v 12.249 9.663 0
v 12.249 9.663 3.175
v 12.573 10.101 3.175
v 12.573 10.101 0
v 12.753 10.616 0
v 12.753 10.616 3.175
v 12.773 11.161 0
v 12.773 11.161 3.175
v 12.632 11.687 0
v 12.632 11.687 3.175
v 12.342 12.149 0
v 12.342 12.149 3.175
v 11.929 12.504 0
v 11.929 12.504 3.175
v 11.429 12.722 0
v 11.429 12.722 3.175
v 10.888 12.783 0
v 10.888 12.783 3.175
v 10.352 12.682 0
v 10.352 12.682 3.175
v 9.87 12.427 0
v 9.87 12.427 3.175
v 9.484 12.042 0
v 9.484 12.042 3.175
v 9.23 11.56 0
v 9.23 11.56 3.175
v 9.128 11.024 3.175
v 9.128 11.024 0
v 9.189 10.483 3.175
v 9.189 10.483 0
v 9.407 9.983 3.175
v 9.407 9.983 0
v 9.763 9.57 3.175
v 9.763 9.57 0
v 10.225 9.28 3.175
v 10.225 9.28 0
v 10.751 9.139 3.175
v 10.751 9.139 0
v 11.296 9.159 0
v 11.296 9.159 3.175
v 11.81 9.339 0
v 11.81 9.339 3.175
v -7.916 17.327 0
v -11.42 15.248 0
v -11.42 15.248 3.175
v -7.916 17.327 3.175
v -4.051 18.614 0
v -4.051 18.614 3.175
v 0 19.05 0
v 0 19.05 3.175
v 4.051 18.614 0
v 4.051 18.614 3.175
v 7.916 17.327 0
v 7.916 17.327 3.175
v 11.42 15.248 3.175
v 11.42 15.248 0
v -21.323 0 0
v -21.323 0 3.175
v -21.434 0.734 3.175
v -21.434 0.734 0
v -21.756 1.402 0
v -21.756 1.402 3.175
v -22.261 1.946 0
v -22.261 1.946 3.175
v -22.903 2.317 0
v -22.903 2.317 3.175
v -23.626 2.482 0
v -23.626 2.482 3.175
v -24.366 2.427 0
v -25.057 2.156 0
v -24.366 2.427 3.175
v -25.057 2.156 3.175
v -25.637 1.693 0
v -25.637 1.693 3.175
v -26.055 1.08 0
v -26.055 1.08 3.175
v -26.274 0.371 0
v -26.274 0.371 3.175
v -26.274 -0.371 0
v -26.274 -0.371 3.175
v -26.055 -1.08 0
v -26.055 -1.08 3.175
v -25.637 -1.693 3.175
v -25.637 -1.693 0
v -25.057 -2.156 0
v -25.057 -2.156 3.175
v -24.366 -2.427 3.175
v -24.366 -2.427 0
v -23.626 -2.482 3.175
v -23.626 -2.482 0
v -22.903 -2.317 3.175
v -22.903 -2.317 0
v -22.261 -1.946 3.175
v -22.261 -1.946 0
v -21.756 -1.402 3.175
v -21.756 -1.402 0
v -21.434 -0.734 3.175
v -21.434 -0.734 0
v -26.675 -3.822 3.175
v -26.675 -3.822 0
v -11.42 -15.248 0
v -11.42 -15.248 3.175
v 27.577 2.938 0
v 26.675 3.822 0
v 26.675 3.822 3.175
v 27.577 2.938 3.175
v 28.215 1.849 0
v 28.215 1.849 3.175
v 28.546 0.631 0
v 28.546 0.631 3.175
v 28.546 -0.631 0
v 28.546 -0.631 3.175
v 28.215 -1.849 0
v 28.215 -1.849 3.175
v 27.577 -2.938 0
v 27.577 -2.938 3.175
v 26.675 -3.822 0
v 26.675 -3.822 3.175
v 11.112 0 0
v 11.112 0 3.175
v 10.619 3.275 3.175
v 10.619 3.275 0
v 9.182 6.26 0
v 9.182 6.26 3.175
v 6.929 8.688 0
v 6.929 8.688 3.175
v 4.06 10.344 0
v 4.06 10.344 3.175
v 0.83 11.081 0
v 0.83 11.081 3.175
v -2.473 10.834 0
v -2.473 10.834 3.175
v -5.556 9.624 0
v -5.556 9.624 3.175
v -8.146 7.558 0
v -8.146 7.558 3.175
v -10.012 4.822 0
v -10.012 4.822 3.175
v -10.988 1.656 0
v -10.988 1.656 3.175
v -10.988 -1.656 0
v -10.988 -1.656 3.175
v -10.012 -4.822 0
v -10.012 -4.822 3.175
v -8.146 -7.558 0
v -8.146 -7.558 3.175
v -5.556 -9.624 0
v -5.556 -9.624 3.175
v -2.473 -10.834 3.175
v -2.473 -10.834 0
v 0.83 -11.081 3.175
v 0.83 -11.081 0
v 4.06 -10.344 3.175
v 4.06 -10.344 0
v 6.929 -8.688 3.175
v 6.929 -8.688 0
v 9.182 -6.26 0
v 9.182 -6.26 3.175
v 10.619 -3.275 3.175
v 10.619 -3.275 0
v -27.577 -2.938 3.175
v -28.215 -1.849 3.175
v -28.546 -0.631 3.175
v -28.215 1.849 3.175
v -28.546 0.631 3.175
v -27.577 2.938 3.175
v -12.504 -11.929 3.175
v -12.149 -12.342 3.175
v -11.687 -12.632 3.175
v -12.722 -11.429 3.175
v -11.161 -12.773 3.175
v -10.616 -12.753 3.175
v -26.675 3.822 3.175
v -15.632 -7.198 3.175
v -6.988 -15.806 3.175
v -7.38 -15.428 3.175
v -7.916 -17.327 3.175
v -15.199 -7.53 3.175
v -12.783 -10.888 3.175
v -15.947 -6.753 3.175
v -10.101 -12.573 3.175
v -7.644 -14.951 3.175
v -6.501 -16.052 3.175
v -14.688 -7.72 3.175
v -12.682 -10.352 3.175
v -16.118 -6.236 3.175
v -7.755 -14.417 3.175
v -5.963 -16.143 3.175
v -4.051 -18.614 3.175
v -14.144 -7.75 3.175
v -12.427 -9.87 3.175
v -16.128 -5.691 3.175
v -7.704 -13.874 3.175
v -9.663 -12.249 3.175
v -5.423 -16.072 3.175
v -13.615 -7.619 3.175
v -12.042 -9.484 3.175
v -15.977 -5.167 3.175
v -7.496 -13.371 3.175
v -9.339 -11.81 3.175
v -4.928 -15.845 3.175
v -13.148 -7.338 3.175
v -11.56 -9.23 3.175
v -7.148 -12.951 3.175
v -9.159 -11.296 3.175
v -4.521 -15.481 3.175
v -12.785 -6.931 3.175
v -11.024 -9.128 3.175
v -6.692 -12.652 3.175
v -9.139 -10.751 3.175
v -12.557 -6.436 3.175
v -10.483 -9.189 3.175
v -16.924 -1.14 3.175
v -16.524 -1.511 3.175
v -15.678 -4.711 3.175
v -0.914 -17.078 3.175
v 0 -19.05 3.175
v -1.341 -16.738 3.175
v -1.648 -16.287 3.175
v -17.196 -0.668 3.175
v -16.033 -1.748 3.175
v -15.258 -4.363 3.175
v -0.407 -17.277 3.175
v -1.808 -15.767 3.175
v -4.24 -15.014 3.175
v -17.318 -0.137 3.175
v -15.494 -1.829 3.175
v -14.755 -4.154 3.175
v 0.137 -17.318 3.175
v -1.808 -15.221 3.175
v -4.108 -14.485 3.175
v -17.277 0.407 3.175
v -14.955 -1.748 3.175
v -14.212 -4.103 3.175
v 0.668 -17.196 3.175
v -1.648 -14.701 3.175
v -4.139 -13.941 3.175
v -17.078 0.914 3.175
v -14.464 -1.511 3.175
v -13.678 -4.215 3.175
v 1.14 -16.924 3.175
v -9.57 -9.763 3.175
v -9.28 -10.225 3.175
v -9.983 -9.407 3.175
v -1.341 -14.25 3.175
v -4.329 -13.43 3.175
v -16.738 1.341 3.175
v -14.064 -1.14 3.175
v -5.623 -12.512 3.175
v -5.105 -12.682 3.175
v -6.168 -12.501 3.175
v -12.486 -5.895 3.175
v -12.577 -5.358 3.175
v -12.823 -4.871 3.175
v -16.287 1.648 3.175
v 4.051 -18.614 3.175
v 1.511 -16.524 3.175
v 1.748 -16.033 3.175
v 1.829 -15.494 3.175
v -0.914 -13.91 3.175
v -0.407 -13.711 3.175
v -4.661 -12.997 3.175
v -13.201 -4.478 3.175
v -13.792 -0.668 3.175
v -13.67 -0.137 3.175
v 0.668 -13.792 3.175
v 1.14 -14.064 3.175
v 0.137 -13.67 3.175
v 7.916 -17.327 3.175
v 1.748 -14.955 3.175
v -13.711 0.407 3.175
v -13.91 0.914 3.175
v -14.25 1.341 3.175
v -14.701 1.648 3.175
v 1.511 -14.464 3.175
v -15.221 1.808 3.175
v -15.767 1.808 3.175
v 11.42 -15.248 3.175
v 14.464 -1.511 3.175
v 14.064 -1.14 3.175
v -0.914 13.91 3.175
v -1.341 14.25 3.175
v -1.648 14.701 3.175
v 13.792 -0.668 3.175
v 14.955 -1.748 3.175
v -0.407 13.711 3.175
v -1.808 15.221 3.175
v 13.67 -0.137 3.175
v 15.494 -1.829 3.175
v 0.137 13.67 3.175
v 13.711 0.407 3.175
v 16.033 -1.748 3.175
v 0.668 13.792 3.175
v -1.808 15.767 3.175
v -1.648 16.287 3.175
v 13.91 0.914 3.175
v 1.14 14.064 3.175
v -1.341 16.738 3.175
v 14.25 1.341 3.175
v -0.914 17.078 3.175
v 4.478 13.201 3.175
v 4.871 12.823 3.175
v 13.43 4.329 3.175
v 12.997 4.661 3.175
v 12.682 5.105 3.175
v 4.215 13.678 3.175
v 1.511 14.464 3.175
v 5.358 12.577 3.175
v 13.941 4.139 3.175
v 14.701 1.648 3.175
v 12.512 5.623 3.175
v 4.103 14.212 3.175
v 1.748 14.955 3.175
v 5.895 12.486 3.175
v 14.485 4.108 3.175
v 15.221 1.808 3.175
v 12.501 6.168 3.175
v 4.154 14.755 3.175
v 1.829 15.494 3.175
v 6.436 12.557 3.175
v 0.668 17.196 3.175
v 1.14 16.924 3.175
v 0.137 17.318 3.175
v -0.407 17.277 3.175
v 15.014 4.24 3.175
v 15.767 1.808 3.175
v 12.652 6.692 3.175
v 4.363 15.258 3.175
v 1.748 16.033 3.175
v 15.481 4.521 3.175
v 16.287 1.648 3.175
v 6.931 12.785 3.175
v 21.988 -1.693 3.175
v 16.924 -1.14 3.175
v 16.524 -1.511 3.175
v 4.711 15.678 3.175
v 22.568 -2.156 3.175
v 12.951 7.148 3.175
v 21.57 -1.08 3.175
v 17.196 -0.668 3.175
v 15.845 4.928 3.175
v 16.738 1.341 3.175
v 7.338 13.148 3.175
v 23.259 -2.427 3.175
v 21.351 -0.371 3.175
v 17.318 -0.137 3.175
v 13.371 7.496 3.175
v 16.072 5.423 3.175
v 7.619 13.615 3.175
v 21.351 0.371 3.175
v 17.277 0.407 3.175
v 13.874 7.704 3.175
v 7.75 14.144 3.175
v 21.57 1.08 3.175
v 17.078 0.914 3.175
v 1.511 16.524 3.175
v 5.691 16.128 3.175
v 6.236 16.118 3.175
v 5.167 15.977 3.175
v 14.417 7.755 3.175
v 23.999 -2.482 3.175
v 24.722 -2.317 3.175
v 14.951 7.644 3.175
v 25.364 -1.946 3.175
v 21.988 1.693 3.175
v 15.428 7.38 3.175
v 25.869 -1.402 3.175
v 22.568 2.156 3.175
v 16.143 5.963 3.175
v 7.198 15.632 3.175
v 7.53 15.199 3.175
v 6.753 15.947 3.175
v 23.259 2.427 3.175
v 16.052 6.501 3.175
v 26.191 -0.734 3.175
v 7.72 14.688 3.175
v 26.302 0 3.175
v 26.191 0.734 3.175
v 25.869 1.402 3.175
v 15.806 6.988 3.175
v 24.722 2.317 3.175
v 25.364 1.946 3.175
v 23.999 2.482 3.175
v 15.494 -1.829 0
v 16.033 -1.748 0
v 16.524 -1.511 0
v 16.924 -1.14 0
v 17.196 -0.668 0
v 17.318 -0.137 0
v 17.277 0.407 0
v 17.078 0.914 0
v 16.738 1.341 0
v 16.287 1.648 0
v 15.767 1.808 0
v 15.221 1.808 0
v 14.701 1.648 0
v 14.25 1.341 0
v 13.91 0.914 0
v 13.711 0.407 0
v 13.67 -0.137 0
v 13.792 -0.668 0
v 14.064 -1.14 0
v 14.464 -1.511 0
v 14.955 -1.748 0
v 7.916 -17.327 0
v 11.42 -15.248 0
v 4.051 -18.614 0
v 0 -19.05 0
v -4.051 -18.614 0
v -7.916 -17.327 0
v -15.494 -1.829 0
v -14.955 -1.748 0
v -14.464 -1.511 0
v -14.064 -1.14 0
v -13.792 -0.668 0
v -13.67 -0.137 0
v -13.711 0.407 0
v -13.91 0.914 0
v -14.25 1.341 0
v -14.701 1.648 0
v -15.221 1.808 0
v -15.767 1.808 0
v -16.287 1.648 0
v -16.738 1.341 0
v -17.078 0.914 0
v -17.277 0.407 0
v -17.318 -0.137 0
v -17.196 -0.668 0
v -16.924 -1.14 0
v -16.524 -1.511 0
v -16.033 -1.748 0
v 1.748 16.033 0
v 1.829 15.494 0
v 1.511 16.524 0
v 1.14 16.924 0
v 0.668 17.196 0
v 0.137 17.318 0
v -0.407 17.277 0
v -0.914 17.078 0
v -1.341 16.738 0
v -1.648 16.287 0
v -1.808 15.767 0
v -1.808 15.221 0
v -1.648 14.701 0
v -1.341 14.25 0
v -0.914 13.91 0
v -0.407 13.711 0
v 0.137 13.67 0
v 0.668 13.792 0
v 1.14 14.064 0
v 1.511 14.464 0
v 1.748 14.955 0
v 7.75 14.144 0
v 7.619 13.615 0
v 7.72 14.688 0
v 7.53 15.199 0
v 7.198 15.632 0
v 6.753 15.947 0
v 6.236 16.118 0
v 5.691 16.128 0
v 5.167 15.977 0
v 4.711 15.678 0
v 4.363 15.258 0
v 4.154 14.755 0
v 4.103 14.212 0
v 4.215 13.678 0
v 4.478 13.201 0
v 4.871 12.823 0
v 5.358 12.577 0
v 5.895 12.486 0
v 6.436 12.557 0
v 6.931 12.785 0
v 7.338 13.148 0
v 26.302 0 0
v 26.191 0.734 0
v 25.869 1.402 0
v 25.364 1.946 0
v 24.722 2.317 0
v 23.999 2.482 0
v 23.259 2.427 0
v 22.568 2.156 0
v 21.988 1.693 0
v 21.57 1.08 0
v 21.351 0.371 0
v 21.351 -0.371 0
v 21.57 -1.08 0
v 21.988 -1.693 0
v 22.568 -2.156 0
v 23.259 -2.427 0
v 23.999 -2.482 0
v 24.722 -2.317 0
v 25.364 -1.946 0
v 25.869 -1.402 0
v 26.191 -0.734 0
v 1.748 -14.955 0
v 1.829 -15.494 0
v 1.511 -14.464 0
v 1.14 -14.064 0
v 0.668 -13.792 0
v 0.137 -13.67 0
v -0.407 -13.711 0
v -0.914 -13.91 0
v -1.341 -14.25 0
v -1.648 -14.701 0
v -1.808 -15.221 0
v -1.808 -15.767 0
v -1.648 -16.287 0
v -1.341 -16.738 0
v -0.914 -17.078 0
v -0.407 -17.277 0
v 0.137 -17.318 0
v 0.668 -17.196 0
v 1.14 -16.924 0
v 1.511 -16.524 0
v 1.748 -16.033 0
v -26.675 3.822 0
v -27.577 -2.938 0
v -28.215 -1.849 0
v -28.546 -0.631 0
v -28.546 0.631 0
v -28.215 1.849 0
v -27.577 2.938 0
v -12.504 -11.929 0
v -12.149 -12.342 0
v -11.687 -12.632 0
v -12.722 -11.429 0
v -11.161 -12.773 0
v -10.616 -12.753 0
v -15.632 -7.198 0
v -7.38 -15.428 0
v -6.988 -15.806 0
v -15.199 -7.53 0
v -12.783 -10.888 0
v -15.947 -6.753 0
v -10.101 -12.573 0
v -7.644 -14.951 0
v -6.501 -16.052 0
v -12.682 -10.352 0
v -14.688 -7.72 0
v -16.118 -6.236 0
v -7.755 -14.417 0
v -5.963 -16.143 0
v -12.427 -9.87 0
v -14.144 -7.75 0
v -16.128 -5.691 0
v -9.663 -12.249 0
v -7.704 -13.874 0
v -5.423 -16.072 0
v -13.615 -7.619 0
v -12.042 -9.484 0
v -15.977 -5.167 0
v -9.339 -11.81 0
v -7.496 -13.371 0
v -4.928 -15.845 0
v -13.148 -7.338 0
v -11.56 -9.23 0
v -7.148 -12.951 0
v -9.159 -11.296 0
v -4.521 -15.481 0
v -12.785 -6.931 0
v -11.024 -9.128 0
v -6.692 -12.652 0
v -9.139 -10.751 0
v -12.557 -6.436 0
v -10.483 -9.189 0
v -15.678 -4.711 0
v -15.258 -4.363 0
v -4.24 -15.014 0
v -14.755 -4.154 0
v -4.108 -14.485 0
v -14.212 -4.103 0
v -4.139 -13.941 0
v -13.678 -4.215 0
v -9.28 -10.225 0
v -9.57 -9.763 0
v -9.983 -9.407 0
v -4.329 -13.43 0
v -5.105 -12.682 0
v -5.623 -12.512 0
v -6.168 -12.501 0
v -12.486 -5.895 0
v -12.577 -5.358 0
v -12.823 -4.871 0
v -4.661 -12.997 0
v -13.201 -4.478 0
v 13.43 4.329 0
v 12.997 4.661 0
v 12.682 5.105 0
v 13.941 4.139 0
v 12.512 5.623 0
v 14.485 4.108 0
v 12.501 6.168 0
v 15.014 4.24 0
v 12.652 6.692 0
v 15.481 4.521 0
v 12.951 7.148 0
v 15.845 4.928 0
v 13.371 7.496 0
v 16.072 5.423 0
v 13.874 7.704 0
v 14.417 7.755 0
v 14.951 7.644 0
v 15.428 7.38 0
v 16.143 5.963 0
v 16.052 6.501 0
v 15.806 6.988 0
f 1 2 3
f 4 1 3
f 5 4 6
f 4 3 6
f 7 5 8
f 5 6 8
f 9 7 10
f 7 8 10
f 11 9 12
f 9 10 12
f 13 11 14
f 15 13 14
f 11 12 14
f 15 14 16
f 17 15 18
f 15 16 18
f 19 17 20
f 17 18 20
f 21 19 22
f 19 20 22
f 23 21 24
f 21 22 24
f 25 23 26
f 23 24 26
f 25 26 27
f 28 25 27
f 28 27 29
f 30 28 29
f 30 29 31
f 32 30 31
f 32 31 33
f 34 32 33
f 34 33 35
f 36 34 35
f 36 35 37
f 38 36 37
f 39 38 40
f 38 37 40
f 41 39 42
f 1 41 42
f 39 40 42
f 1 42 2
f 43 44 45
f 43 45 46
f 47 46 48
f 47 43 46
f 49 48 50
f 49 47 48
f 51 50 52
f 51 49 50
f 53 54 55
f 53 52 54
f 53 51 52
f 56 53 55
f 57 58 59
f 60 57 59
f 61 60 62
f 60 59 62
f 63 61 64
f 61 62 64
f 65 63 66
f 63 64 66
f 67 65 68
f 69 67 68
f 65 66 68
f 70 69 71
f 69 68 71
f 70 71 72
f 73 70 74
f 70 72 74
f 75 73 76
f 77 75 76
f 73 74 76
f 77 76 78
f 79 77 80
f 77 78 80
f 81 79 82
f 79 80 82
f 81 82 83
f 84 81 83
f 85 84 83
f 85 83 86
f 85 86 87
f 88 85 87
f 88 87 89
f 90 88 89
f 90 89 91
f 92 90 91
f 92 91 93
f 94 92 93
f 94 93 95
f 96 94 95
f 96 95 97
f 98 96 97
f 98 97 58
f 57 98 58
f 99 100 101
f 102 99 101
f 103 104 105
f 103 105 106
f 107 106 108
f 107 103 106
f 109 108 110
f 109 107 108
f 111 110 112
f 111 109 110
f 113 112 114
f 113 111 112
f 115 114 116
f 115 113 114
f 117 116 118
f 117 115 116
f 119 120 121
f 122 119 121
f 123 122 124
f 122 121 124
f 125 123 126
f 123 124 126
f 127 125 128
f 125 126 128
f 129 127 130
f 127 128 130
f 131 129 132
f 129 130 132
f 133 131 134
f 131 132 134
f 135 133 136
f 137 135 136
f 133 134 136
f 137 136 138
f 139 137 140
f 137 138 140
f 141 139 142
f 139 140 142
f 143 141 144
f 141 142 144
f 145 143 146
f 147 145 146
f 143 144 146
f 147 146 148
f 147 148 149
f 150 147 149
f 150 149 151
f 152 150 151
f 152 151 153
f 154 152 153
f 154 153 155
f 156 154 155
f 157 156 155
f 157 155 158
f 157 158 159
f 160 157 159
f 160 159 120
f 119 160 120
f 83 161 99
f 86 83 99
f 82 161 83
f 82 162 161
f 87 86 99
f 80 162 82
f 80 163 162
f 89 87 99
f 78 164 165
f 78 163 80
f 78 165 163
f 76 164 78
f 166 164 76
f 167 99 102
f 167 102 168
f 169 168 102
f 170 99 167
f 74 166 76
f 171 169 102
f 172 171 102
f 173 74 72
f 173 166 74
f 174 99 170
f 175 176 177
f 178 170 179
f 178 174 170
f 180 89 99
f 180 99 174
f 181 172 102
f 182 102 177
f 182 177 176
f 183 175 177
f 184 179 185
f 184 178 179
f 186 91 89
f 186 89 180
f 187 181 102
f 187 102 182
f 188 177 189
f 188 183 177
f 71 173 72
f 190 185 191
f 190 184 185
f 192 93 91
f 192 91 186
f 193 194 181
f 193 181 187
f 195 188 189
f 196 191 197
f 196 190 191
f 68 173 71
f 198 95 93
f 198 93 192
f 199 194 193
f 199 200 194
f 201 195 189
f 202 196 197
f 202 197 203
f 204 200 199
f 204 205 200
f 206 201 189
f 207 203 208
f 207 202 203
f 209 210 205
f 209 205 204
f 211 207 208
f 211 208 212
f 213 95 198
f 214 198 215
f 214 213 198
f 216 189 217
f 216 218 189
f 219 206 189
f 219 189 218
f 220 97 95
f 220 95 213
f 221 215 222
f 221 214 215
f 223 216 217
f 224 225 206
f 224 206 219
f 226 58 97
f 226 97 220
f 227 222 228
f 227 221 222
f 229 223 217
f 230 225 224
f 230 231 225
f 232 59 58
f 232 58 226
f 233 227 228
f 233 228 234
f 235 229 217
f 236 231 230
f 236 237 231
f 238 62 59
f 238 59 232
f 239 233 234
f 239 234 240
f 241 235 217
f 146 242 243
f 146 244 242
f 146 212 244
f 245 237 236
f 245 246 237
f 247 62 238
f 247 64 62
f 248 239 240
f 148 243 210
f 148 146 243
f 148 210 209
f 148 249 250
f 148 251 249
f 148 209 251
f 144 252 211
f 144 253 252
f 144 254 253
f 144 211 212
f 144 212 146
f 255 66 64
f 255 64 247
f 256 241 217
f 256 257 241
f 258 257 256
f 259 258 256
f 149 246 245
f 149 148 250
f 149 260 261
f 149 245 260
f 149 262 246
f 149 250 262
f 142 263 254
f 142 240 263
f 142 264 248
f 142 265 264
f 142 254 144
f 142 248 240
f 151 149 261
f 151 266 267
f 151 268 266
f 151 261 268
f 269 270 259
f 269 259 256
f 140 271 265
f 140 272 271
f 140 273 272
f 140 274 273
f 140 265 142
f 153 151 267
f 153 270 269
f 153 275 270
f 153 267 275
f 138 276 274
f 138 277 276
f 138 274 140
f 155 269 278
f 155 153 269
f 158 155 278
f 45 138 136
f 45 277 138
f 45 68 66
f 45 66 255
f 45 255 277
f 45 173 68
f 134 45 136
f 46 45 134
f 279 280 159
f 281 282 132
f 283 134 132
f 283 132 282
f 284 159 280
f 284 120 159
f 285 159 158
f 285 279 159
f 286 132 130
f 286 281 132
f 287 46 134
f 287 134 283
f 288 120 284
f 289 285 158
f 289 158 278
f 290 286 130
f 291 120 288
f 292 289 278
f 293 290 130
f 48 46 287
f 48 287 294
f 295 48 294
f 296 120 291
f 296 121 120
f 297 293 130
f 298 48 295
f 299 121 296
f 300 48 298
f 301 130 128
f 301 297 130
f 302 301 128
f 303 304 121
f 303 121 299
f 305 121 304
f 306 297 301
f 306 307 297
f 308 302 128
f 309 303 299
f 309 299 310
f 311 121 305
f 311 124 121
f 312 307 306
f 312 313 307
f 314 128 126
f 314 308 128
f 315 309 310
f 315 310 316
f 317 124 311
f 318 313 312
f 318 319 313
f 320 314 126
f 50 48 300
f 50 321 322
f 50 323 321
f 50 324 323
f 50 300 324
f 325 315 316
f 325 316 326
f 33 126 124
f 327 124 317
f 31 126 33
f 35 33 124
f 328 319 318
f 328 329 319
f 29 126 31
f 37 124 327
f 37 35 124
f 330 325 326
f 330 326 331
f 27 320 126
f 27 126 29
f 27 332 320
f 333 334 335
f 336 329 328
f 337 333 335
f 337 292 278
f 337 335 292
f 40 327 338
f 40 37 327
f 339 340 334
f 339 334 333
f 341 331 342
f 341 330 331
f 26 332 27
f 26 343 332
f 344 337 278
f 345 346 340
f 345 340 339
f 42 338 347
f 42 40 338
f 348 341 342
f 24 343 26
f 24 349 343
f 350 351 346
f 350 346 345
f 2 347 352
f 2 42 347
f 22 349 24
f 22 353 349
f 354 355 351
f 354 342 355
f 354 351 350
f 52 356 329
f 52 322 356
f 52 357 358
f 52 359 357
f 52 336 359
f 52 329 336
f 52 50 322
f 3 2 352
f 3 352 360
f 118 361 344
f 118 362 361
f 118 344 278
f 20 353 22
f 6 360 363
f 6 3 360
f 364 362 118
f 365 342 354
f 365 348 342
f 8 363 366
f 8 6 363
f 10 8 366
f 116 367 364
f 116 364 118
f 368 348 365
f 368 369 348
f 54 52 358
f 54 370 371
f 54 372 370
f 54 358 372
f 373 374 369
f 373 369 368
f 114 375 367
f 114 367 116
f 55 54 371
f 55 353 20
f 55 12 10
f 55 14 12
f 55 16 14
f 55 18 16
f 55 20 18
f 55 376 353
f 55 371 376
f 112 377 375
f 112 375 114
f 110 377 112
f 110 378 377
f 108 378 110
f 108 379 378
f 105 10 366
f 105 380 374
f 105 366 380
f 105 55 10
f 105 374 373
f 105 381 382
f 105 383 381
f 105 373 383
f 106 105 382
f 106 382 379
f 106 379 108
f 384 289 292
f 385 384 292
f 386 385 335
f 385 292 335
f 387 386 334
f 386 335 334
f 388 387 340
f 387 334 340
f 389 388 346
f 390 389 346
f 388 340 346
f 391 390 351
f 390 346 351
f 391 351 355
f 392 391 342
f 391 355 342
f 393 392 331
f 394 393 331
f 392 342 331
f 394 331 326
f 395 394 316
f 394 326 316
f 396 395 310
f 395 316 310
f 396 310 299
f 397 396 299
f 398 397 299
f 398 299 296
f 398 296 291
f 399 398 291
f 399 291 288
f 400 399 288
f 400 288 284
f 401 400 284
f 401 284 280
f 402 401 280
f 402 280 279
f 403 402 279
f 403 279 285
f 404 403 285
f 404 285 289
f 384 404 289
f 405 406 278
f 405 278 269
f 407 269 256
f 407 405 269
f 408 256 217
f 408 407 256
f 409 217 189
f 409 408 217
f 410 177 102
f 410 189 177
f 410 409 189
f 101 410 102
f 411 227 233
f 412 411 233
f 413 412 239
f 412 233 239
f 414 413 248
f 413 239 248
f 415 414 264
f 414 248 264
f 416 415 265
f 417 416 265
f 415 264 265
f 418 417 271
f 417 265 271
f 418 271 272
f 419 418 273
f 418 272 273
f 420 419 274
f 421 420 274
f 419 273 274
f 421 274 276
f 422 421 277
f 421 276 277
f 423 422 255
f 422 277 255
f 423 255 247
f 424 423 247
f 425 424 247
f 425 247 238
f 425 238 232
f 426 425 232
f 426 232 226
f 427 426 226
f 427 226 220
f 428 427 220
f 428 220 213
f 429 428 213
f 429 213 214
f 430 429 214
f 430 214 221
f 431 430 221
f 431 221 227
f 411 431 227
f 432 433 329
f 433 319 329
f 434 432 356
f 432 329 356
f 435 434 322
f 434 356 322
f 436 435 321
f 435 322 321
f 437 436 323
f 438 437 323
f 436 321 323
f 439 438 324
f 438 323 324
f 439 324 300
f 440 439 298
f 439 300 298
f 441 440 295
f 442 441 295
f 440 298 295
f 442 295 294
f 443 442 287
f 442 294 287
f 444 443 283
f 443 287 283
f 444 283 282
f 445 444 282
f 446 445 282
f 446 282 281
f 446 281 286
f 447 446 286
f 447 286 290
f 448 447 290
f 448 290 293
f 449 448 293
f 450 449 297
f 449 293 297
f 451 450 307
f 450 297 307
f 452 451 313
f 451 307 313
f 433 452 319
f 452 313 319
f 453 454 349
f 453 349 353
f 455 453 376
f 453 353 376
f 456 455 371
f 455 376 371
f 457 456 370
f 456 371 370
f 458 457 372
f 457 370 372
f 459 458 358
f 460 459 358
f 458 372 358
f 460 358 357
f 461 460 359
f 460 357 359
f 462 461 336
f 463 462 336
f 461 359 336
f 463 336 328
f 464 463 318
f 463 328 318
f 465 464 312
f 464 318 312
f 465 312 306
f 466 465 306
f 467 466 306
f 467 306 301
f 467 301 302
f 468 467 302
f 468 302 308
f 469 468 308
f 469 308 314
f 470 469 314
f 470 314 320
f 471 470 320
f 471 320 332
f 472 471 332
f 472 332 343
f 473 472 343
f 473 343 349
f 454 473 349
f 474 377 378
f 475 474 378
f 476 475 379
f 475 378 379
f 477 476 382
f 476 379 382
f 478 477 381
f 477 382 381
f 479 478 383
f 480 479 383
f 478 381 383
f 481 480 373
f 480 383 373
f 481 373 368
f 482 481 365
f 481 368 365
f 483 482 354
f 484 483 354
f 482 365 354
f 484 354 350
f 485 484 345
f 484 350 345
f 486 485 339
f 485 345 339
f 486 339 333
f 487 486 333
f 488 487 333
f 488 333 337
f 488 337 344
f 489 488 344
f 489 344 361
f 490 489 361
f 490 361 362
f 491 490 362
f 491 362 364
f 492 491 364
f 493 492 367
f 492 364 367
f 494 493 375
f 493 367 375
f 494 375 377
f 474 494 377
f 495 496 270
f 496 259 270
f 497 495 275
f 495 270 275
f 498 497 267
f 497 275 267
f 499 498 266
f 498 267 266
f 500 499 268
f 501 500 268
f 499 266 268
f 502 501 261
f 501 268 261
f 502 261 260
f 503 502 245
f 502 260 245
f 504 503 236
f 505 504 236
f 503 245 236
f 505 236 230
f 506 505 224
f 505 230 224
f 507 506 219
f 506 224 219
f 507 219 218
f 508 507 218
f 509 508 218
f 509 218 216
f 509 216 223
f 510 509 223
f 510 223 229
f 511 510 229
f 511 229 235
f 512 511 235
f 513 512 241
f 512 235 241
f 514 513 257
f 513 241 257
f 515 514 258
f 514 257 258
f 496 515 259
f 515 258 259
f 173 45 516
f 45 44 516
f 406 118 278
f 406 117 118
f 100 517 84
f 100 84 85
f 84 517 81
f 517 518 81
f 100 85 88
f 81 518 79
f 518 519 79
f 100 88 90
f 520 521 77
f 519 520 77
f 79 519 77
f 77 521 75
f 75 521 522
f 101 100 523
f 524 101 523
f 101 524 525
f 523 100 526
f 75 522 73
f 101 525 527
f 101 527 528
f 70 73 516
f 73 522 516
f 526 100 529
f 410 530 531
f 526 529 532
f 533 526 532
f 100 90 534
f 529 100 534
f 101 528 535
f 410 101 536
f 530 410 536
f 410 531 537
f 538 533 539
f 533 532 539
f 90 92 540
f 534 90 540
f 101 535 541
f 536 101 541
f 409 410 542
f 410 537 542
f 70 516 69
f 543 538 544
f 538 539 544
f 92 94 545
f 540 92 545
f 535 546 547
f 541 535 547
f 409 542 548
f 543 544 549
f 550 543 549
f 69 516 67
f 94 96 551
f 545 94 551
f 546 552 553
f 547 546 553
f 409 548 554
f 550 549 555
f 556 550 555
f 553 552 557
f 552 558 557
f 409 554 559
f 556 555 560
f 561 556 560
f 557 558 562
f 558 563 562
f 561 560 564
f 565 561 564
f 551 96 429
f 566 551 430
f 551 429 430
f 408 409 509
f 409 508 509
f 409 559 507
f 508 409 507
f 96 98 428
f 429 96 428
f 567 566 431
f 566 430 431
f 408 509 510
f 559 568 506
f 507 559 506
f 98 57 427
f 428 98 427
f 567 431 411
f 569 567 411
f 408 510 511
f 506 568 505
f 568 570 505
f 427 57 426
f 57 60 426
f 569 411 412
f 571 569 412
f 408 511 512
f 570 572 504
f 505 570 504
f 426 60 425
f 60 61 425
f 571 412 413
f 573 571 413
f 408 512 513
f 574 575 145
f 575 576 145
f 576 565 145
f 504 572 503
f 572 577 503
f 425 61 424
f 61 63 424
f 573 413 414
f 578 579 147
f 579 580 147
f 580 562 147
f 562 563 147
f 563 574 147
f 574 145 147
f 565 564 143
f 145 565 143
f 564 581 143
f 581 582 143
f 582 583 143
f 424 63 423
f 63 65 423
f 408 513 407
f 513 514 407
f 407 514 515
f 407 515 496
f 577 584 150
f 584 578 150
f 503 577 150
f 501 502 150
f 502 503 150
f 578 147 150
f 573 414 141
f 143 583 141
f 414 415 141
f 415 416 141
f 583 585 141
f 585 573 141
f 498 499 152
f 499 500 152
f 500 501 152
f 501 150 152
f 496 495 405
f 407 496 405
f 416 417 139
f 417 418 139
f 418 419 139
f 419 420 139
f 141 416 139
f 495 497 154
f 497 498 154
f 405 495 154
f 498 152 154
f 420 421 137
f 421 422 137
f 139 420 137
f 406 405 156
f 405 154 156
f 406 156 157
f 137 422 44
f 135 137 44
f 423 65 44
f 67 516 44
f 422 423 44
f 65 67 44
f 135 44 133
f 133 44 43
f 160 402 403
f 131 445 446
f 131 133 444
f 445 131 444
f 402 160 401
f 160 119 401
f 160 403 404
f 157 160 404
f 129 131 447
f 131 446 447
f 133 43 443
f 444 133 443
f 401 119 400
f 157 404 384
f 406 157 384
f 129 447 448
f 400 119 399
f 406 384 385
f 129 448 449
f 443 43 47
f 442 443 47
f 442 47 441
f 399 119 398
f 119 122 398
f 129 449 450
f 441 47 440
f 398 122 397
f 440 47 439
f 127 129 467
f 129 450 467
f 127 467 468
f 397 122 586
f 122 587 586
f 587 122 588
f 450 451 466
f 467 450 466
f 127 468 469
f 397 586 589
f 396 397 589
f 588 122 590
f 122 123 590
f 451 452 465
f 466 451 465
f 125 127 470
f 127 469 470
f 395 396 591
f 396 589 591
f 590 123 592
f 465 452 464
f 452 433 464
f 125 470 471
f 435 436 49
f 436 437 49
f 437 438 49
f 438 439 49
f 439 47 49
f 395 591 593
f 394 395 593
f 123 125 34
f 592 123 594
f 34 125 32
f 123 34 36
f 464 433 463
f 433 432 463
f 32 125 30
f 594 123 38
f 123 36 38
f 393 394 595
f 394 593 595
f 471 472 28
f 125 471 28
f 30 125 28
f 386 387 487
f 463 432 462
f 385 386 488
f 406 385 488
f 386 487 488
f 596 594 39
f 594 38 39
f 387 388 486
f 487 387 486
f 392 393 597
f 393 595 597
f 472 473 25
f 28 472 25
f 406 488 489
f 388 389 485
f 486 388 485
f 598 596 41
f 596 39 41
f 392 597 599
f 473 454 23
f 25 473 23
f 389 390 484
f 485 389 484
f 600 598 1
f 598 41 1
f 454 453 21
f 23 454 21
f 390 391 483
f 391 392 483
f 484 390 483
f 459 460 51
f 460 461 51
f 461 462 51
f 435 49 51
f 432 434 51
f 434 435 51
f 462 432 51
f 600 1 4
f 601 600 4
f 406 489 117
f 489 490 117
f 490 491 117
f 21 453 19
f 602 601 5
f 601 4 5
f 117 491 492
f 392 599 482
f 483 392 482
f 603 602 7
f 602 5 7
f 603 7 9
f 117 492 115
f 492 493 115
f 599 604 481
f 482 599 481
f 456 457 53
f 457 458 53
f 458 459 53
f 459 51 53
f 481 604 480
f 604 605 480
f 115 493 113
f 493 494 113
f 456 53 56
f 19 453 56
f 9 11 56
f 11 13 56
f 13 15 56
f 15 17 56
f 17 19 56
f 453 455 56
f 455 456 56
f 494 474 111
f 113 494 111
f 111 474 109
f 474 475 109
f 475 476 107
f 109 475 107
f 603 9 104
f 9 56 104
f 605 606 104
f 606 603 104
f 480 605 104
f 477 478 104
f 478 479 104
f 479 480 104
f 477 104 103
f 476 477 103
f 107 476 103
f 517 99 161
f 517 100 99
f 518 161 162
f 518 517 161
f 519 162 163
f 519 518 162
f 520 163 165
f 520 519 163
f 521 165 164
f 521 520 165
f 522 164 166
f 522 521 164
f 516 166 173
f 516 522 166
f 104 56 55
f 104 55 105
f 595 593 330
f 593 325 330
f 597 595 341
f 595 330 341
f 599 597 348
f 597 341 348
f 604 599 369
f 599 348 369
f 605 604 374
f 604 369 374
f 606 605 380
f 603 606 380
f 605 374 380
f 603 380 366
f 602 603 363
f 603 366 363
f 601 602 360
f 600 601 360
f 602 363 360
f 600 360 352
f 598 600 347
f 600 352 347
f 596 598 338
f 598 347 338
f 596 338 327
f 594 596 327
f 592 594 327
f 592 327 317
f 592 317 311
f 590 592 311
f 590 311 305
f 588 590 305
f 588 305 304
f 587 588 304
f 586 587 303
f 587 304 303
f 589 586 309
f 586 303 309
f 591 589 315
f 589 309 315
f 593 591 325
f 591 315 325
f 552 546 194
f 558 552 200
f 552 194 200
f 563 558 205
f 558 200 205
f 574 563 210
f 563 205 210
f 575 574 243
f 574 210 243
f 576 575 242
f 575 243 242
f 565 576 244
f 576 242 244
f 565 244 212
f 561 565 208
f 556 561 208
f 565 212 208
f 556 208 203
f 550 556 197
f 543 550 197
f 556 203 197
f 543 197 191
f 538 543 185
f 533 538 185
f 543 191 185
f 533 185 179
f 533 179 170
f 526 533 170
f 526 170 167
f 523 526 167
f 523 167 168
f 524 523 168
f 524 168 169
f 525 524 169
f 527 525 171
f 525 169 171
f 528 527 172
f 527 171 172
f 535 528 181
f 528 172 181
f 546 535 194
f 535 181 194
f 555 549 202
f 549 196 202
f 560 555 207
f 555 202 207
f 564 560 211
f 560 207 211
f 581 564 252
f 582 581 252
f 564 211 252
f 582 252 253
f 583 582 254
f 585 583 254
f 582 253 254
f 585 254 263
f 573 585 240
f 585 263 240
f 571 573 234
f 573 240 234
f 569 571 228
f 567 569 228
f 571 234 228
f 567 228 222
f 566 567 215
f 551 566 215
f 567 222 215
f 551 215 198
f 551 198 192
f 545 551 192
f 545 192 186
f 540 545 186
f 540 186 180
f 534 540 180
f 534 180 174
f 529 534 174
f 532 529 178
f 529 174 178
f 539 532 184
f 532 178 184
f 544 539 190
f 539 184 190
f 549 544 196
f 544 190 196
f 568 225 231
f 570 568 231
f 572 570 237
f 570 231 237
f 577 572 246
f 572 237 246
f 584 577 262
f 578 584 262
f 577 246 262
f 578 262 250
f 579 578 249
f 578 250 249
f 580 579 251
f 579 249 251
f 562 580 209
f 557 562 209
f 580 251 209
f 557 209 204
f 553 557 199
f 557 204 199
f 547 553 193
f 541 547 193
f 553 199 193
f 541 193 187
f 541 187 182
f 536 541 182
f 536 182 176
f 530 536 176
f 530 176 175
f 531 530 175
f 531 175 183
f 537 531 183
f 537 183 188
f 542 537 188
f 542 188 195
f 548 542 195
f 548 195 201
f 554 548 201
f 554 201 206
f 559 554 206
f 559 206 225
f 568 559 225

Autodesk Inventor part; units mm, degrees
ref_plane "YZ Plane" through (0, 0, 0) normal (1, 0, 0) x (0, 1, 0)
ref_plane "XZ Plane" through (0, 0, 0) normal (0, 1, 0) x (-1, 0, 0)
ref_plane "XY Plane" through (0, 0, 0) normal (0, 0, 1) x (1, 0, 0)
sketch "Sketch1" plane through (0, 0, 0) normal (0, 0, 1) x (1, 0, 0)
  line L0 (-11.4198, 15.2476) -> (-26.6751, 3.8221)
  line L1 (-26.6751, -3.8221) -> (-11.4198, -15.2476)
  line L2 (11.4198, 15.2476) -> (26.6751, 3.8221)
  line L3 (26.6751, -3.8221) -> (11.4198, -15.2476)
  line L4 (-31.7782, 0) -> (31.7782, 0) construction
  arc A0 (-26.6751, 3.8221) -> (-26.6751, -3.8221) centre (-23.8125, 0) ccw
  arc A1 (26.6751, -3.8221) -> (26.6751, 3.8221) centre (23.8125, 0) ccw
  arc A2 (-11.4198, -15.2476) -> (11.4198, -15.2476) centre (0, 0) ccw
  arc A3 (11.4198, 15.2476) -> (-11.4198, 15.2476) centre (0, 0) ccw
  dimension "d1" = 4.7752
  dimension "d2" = 47.625
extrude "Extrusion1" add sketch "Sketch1" along normal blind 3.175
sketch "Sketch2" plane through (0, 0, 3.175) normal (0, 0, 1) x (1, 0, 0)
  arc A0 (-26.6751, 3.8221) -> (-26.6751, -3.8221) centre (-23.8125, 0) ccw projected
  arc A1 (26.6751, -3.8221) -> (26.6751, 3.8221) centre (23.8125, 0) ccw projected
  circle A2 centre (-23.8125, 0) radius 2.4892
  circle A3 centre (23.8125, 0) radius 2.4892
  circle A4 centre (0, 0) radius 11.1125
  dimension "d5" = 22.225
  dimension "d6" = 4.9784
extrude "Extrusion2" cut sketch "Sketch2" against normal blind 3.175
sketch "Sketch3" plane through (0, 0, 3.175) normal (0, 0, 1) x (1, 0, 0)
  arc A0 (11.4198, 15.2476) -> (-11.4198, 15.2476) centre (0, 0) ccw projected
  line L0 (0, 19.05) -> (0, -19.6536) construction
  circle A1 centre (0, 15.494) radius 1.8288
  circle A2 centre (0, -15.494) radius 1.8288
  dimension "d9" = 30.988
  dimension "d10" = 15.494
  dimension "d11" = 3.6576
extrude "Extrusion3" cut sketch "Sketch3" against normal blind 3.175
pattern_circular "Circular Pattern1" count 5 over 90 about axis through (0, 0, 3.175) along (0, 0, -1) of "Extrusion3"
properties part number "Pancake Mount Plate" material "Steel, Galvanized"
